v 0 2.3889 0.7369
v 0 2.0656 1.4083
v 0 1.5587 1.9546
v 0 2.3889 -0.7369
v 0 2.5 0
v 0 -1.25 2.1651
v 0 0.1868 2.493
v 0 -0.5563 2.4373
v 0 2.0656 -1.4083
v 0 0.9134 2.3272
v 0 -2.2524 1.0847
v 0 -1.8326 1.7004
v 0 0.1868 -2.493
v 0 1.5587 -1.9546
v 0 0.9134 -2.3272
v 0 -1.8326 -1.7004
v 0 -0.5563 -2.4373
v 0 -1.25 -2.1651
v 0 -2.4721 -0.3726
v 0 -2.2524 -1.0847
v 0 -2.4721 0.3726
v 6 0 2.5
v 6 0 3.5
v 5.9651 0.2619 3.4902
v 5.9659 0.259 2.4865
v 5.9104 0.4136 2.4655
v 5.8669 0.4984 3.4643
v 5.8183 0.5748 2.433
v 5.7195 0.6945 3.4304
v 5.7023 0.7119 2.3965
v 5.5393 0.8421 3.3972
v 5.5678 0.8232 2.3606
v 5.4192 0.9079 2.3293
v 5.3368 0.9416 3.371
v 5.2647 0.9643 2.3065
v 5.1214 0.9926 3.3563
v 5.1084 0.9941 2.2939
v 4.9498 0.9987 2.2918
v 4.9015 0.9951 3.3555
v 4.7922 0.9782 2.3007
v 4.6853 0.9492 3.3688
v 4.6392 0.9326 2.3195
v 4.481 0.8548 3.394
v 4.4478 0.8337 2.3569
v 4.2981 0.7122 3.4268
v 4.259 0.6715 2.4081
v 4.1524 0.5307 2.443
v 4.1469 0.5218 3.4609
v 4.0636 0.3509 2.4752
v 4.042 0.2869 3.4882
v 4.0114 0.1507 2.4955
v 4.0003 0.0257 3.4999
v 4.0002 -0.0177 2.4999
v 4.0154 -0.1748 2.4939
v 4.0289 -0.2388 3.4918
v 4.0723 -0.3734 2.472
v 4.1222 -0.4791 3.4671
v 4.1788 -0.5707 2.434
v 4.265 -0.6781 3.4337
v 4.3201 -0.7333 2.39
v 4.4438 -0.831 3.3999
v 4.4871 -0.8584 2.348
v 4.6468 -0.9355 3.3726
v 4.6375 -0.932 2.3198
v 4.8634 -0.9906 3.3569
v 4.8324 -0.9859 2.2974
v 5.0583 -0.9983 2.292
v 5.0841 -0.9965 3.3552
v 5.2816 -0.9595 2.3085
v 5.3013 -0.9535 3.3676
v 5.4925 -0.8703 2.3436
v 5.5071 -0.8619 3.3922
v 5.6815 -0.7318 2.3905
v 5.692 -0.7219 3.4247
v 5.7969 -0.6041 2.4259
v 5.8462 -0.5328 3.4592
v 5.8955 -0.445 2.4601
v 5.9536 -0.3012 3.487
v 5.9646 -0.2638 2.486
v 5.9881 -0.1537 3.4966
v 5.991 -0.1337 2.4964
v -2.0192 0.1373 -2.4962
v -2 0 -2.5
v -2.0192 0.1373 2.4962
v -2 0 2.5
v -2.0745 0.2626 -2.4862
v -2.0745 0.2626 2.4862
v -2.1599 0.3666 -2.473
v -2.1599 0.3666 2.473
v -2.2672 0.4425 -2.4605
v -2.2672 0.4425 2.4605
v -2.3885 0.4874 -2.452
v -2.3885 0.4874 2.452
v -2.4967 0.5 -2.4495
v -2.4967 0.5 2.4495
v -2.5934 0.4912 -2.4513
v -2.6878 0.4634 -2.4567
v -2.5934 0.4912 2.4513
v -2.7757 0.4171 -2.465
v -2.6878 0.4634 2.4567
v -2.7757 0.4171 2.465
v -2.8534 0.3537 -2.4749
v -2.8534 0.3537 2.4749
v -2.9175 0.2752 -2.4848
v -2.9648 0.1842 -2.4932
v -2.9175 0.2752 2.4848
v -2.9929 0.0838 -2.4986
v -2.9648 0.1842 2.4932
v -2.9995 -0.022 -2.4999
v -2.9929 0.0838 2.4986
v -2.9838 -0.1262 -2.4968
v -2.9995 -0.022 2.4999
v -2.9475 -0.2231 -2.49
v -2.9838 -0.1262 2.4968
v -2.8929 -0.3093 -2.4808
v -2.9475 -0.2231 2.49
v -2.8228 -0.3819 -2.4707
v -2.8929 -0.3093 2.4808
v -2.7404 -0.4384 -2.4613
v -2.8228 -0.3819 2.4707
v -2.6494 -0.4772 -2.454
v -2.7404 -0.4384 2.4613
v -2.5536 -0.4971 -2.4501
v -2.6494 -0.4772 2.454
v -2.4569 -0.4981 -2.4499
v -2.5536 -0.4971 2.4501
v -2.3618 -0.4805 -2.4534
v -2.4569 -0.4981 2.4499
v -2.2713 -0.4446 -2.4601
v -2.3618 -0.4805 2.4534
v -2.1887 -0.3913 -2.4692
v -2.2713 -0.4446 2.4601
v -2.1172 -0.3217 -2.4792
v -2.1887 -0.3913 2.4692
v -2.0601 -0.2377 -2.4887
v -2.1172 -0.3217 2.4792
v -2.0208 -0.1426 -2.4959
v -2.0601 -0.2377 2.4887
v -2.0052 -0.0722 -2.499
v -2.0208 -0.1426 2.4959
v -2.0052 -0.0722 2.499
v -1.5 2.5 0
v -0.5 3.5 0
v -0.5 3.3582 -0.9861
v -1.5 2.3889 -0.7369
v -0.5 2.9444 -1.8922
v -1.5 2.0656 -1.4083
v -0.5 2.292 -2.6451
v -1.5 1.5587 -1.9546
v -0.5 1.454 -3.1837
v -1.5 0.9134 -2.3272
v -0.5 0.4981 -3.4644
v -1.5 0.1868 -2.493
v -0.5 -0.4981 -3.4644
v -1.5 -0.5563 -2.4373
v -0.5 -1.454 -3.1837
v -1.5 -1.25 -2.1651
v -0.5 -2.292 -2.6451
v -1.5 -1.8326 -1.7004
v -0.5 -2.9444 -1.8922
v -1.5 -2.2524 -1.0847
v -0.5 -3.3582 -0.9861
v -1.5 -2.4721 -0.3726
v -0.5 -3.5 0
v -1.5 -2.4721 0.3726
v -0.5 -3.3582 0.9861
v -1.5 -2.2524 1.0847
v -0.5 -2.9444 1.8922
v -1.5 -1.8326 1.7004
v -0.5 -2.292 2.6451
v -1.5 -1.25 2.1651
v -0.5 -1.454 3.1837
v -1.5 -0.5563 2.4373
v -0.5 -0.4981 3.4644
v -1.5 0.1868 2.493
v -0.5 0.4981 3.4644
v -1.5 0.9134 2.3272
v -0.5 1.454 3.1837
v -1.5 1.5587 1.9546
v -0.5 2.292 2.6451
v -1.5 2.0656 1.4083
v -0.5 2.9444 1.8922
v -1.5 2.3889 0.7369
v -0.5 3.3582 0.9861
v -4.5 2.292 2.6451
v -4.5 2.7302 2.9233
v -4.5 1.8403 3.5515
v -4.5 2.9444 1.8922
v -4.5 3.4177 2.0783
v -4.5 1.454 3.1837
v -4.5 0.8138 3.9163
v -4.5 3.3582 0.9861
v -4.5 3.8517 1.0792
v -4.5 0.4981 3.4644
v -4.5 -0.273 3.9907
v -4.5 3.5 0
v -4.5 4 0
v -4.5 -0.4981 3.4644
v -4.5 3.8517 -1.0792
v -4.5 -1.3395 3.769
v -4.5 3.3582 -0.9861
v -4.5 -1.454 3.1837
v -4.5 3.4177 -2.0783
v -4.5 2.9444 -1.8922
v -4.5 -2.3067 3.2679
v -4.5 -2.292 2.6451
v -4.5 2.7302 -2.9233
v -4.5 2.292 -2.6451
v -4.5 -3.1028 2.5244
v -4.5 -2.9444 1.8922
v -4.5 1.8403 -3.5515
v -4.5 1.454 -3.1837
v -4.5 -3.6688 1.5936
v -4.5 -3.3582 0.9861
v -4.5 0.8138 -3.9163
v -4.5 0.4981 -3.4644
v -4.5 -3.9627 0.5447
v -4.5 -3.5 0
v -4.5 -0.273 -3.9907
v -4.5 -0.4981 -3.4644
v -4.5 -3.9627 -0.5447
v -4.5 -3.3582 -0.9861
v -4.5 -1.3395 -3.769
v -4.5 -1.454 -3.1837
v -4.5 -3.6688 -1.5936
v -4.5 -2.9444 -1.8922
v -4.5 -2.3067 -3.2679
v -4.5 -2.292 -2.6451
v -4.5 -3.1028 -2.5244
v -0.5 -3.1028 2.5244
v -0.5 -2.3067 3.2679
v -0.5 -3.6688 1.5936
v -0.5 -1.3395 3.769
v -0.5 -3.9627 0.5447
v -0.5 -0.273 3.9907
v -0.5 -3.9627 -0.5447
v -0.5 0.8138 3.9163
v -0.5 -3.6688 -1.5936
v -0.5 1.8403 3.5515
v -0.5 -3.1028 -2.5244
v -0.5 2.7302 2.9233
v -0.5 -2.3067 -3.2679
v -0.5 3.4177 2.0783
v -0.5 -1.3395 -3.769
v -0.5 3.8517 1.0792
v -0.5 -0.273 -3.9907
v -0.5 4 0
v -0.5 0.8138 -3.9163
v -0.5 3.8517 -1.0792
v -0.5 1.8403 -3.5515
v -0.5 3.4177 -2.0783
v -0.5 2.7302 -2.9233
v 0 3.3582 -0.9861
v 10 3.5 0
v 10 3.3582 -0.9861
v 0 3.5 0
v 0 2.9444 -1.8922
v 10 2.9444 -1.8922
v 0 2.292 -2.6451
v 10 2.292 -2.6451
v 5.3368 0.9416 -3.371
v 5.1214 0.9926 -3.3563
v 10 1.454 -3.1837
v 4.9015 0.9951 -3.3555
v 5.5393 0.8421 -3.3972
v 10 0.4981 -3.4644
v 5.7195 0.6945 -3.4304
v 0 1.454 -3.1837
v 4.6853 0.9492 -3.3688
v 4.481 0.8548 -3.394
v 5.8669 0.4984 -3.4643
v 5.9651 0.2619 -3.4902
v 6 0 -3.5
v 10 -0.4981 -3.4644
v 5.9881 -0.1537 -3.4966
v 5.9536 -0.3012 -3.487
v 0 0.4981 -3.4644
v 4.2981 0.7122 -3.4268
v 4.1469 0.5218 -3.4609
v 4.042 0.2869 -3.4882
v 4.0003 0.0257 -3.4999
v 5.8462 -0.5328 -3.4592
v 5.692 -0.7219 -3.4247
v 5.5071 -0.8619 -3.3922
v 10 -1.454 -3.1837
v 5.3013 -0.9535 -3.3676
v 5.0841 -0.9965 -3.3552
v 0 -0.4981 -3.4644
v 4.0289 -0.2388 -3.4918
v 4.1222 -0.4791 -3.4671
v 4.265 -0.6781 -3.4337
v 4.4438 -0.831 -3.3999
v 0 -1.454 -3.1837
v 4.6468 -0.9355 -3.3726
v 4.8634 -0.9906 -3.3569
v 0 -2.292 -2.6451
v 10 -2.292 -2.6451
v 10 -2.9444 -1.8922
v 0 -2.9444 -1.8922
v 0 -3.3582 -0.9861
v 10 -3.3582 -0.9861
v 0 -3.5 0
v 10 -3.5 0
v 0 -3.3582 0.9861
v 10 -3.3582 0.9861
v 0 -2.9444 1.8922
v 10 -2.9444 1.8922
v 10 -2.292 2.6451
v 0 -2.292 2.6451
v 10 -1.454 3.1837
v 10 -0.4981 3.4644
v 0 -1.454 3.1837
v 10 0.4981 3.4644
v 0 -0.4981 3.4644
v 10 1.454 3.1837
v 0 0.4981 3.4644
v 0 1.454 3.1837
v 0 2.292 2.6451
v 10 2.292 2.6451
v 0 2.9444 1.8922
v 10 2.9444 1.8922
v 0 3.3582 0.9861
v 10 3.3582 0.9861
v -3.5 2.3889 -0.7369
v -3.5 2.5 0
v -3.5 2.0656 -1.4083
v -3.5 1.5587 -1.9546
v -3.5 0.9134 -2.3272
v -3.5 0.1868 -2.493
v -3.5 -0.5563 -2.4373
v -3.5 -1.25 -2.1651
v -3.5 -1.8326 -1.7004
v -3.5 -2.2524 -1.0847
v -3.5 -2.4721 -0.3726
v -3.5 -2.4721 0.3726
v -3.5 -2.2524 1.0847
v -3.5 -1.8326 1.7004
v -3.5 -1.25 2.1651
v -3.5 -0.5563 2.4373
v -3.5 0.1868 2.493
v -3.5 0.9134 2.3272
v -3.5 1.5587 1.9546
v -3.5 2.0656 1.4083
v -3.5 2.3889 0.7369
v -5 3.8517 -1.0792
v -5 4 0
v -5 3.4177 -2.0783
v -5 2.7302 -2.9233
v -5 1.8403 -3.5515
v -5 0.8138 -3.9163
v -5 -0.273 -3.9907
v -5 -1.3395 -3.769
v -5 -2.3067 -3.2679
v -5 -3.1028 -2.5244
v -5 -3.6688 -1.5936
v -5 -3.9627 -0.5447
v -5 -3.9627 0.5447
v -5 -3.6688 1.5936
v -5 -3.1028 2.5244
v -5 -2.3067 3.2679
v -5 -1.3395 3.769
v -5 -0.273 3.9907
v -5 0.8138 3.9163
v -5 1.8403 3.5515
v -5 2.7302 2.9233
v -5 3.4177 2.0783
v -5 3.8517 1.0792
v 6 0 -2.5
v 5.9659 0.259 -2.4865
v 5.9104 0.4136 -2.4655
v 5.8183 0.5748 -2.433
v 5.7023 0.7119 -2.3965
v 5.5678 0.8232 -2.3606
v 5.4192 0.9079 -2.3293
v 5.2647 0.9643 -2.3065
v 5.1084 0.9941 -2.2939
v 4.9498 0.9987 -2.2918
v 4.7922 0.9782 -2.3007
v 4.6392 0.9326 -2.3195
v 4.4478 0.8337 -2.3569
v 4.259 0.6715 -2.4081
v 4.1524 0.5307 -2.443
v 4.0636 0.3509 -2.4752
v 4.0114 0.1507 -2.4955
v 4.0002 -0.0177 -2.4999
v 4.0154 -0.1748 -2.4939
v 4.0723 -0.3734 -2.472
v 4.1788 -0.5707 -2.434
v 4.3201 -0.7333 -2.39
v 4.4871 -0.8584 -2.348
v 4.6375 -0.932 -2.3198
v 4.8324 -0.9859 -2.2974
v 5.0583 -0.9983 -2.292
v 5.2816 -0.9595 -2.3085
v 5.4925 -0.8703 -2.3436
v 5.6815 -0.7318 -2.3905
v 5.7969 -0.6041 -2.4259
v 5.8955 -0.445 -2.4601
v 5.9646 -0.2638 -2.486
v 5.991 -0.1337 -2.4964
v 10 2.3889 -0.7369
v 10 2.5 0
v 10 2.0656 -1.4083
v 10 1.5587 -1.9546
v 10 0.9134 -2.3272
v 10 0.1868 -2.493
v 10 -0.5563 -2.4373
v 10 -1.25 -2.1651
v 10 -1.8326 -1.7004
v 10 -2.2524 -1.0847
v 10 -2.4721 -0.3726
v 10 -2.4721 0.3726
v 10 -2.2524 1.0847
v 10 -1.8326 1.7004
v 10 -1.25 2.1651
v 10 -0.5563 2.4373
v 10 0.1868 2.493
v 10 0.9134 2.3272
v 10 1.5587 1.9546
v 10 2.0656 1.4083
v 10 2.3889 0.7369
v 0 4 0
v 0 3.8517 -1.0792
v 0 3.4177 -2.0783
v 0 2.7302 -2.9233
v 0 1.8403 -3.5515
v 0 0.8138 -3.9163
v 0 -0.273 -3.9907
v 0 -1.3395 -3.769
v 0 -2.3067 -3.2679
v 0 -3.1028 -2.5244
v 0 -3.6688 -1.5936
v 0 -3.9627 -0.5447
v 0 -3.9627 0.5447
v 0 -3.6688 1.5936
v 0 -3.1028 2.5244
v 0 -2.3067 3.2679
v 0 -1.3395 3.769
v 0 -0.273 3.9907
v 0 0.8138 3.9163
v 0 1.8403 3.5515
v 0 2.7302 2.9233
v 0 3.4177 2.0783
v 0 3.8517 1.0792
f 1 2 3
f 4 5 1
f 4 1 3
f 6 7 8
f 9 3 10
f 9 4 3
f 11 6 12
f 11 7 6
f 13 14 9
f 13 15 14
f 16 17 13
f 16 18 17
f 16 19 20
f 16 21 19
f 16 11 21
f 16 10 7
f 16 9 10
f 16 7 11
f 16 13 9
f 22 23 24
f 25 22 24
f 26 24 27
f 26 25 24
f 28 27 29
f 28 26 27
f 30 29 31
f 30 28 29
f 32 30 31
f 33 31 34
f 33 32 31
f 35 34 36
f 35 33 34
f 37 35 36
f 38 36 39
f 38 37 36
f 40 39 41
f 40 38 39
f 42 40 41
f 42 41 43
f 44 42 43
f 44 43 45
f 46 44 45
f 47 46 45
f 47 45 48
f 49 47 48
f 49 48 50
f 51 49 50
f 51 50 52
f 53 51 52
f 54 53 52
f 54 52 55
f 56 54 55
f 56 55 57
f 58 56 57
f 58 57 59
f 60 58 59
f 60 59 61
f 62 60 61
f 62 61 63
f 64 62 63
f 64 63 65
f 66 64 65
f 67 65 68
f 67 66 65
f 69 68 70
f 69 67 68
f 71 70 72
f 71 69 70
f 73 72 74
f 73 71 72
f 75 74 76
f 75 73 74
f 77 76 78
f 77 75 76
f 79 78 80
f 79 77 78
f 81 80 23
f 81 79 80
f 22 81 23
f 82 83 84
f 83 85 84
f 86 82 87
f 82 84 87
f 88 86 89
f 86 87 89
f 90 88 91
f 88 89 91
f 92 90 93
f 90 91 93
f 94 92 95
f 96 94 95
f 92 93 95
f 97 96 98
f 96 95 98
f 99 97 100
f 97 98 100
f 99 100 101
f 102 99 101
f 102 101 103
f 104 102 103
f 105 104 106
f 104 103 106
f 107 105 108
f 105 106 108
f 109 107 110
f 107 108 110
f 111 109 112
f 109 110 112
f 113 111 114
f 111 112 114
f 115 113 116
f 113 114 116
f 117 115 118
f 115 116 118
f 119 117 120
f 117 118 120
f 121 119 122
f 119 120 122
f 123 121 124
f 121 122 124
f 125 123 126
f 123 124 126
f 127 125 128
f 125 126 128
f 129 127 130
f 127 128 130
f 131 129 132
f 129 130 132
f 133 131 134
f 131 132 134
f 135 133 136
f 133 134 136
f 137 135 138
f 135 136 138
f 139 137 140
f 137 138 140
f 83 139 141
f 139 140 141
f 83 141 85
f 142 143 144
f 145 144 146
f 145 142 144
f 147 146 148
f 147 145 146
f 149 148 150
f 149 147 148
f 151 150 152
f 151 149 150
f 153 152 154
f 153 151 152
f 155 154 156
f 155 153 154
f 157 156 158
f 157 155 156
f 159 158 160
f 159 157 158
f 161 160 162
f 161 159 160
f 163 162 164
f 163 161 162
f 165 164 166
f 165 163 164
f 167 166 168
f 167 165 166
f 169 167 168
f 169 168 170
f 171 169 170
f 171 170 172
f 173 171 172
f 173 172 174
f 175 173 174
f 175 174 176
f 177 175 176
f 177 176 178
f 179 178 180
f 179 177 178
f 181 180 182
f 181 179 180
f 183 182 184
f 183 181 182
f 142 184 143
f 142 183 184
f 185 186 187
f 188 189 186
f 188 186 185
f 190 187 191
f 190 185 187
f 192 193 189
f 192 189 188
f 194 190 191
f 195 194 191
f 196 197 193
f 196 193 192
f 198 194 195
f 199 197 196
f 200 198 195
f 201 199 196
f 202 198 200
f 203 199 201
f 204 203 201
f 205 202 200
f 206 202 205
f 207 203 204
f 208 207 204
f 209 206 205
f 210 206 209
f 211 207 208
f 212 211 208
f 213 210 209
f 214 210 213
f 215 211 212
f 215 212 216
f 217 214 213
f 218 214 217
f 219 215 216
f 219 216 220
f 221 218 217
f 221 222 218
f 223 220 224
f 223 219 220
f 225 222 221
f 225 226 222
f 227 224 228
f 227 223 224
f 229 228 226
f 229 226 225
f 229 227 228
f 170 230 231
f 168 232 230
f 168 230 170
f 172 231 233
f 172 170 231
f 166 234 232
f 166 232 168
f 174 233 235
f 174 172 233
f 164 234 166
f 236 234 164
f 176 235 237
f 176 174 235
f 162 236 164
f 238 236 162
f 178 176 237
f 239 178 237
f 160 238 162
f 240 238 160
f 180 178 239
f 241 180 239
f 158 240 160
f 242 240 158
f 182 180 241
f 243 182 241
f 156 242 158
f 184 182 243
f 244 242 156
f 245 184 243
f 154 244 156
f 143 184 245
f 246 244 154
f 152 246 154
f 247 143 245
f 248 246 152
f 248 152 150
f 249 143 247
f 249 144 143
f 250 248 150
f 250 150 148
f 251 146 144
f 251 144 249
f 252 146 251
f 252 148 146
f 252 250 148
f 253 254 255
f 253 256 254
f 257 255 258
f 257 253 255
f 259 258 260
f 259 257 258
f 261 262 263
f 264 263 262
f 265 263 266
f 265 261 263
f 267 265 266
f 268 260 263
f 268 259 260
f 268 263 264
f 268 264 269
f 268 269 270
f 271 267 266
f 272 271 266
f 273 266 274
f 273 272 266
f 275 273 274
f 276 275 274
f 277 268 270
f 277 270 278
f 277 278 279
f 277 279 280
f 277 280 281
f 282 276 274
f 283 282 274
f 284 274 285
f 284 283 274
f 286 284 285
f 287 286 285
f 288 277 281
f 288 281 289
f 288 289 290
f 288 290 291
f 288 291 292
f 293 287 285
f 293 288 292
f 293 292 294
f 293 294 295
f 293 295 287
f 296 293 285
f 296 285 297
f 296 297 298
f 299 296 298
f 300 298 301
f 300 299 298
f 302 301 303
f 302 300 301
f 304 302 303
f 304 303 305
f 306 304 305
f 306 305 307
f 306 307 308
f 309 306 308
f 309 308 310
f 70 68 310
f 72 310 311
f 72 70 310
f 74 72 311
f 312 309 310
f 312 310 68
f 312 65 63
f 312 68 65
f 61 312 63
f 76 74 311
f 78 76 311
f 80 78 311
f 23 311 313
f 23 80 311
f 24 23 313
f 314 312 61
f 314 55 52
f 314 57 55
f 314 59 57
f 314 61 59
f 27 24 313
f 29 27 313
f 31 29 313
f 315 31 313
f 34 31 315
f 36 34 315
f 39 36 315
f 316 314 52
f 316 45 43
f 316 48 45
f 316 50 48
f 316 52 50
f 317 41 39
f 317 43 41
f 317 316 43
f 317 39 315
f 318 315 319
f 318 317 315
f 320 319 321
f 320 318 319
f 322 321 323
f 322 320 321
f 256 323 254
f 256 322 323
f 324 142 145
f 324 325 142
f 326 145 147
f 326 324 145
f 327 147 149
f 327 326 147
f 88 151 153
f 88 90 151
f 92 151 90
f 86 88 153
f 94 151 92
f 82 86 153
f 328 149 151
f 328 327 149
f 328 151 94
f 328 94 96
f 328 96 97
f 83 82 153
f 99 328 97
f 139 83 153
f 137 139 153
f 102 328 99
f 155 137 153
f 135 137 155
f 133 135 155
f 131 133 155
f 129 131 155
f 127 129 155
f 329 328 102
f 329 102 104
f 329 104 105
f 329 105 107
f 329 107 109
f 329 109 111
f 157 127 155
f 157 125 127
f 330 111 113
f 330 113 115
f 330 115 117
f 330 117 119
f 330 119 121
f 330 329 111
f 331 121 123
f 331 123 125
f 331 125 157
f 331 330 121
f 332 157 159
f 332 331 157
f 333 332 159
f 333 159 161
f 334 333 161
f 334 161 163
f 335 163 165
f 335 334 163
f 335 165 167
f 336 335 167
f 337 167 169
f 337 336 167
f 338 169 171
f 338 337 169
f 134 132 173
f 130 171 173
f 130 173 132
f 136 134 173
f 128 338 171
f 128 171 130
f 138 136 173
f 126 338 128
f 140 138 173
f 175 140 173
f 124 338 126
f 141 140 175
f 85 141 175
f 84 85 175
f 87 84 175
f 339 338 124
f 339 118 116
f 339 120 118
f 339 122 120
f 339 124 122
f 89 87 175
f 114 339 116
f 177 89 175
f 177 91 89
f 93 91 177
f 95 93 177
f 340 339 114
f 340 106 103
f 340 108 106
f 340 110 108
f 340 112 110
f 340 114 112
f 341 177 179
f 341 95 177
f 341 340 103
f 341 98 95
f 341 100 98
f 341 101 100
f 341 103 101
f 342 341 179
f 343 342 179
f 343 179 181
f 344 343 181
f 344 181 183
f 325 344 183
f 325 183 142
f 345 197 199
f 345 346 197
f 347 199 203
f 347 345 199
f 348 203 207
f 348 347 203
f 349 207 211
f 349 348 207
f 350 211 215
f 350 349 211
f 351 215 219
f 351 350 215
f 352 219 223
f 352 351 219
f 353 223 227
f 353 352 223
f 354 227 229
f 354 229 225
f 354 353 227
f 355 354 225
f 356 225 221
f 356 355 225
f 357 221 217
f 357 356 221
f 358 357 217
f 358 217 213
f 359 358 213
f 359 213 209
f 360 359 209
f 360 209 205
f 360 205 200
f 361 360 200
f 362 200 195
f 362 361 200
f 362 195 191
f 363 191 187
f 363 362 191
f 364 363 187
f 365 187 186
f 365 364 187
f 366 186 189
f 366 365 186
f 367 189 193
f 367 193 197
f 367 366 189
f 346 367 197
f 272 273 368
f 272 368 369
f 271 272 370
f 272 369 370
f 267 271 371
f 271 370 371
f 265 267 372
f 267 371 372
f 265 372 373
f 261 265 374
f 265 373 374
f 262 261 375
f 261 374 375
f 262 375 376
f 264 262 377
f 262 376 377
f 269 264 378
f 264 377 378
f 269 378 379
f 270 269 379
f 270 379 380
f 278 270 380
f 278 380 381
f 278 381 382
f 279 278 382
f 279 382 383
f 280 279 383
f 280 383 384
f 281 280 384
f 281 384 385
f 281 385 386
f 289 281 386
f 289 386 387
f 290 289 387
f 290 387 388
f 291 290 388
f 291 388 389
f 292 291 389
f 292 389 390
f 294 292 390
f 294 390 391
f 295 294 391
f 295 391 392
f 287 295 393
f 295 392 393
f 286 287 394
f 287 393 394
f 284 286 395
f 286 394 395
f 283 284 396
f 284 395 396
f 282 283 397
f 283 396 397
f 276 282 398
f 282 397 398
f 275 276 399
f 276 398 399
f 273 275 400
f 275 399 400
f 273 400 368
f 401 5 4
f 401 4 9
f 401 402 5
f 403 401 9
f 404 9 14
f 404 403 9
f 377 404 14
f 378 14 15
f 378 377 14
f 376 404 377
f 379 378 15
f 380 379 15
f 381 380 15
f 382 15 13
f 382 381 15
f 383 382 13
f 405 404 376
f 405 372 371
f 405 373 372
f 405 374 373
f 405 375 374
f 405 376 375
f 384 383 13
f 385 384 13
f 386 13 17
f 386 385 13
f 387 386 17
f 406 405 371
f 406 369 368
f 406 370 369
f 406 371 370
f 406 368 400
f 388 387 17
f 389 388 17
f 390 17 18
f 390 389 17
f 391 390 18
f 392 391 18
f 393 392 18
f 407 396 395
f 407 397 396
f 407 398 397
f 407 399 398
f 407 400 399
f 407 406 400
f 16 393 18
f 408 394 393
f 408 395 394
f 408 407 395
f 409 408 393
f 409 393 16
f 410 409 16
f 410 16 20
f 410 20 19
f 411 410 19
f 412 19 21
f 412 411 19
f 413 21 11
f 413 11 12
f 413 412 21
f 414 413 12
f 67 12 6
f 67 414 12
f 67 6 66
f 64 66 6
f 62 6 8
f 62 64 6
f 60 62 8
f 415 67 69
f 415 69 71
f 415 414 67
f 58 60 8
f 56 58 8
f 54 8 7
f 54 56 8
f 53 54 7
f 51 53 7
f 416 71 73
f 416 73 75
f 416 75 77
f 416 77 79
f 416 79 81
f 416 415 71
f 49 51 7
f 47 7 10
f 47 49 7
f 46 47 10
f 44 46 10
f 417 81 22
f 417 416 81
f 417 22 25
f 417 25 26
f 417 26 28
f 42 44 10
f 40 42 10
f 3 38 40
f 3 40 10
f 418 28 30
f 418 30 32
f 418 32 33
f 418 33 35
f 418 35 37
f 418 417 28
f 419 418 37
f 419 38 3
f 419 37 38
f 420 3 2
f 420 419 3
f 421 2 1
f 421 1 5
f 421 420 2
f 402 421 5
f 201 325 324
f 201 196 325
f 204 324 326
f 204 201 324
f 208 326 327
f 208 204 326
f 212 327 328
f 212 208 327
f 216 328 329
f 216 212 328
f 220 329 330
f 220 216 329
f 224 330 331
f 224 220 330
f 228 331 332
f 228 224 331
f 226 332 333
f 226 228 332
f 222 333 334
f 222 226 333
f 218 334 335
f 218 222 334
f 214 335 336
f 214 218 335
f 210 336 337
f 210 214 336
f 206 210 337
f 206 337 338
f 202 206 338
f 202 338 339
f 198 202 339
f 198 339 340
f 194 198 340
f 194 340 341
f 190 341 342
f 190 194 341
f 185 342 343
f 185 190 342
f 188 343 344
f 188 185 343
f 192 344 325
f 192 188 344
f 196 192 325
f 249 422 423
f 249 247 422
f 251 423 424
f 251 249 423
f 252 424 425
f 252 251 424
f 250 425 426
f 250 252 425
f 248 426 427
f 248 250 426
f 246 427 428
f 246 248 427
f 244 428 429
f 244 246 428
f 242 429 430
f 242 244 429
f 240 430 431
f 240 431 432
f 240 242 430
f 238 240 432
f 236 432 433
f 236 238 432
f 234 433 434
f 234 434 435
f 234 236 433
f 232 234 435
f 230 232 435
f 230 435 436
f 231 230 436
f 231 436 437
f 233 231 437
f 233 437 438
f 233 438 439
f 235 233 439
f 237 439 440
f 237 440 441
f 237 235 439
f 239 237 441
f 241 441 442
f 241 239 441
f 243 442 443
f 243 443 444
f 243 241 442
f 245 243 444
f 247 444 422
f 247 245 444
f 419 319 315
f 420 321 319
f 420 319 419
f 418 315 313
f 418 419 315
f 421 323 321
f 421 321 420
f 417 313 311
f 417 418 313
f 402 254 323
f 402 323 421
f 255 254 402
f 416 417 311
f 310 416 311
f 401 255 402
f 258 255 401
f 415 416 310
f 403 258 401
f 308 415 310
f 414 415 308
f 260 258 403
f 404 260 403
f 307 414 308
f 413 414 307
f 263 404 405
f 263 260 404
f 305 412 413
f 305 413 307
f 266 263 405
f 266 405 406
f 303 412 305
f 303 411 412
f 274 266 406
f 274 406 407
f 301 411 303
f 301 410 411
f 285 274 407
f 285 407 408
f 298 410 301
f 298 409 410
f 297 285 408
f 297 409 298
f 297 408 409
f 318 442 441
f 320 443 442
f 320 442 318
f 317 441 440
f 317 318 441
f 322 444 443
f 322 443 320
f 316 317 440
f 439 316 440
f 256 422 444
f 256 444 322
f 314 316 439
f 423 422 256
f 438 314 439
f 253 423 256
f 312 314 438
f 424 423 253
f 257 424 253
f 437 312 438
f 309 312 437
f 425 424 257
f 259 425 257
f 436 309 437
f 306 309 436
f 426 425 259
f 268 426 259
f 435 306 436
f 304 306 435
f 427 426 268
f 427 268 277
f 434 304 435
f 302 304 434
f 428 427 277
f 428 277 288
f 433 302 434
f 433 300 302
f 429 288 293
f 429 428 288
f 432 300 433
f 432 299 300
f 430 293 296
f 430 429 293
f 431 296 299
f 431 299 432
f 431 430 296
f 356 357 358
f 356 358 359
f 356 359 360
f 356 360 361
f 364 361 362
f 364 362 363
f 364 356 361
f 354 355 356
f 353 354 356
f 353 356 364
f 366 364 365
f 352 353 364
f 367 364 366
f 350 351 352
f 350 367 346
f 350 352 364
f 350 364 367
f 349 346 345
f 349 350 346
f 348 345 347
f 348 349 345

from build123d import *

# Parameters (mm, degrees)
SKETCH3_R               = 0.5
SKETCH3_R_2             = 1
CUT_EXTRUDE1_DEPTH      = 5
CUT_EXTRUDE1_DEPTH_BACK = 5


with BuildPart() as part:
    # Sketch1 → Revolve1 (revolve)
    with BuildSketch(Plane.XY):
        Polygon((0, 0), (0, 2.5), (10, 2.5), (10, 3.5), (0, 3.5), (0, 4), (-0.5, 4), (-0.5, 3.5), (-1.5, 2.5), (-3.5, 2.5), (-4.5, 3.5), (-4.5, 4), (-5, 4), (-5, 0), align=None)
    revolve(axis=Axis((0, 0, 0), (-1, 0, 0)))

    # Sketch3 → Cut-Extrude1 (cut, two sides)
    with BuildSketch(Plane.XY) as cut_extrude1_sk:
        with Locations((-2.5, 0)):
            Circle(SKETCH3_R)
        with Locations((5, 0)):
            Circle(SKETCH3_R_2)
    extrude(amount=CUT_EXTRUDE1_DEPTH, mode=Mode.SUBTRACT)
    extrude(cut_extrude1_sk.sketch, amount=-CUT_EXTRUDE1_DEPTH_BACK, mode=Mode.SUBTRACT)


solid = part.part
